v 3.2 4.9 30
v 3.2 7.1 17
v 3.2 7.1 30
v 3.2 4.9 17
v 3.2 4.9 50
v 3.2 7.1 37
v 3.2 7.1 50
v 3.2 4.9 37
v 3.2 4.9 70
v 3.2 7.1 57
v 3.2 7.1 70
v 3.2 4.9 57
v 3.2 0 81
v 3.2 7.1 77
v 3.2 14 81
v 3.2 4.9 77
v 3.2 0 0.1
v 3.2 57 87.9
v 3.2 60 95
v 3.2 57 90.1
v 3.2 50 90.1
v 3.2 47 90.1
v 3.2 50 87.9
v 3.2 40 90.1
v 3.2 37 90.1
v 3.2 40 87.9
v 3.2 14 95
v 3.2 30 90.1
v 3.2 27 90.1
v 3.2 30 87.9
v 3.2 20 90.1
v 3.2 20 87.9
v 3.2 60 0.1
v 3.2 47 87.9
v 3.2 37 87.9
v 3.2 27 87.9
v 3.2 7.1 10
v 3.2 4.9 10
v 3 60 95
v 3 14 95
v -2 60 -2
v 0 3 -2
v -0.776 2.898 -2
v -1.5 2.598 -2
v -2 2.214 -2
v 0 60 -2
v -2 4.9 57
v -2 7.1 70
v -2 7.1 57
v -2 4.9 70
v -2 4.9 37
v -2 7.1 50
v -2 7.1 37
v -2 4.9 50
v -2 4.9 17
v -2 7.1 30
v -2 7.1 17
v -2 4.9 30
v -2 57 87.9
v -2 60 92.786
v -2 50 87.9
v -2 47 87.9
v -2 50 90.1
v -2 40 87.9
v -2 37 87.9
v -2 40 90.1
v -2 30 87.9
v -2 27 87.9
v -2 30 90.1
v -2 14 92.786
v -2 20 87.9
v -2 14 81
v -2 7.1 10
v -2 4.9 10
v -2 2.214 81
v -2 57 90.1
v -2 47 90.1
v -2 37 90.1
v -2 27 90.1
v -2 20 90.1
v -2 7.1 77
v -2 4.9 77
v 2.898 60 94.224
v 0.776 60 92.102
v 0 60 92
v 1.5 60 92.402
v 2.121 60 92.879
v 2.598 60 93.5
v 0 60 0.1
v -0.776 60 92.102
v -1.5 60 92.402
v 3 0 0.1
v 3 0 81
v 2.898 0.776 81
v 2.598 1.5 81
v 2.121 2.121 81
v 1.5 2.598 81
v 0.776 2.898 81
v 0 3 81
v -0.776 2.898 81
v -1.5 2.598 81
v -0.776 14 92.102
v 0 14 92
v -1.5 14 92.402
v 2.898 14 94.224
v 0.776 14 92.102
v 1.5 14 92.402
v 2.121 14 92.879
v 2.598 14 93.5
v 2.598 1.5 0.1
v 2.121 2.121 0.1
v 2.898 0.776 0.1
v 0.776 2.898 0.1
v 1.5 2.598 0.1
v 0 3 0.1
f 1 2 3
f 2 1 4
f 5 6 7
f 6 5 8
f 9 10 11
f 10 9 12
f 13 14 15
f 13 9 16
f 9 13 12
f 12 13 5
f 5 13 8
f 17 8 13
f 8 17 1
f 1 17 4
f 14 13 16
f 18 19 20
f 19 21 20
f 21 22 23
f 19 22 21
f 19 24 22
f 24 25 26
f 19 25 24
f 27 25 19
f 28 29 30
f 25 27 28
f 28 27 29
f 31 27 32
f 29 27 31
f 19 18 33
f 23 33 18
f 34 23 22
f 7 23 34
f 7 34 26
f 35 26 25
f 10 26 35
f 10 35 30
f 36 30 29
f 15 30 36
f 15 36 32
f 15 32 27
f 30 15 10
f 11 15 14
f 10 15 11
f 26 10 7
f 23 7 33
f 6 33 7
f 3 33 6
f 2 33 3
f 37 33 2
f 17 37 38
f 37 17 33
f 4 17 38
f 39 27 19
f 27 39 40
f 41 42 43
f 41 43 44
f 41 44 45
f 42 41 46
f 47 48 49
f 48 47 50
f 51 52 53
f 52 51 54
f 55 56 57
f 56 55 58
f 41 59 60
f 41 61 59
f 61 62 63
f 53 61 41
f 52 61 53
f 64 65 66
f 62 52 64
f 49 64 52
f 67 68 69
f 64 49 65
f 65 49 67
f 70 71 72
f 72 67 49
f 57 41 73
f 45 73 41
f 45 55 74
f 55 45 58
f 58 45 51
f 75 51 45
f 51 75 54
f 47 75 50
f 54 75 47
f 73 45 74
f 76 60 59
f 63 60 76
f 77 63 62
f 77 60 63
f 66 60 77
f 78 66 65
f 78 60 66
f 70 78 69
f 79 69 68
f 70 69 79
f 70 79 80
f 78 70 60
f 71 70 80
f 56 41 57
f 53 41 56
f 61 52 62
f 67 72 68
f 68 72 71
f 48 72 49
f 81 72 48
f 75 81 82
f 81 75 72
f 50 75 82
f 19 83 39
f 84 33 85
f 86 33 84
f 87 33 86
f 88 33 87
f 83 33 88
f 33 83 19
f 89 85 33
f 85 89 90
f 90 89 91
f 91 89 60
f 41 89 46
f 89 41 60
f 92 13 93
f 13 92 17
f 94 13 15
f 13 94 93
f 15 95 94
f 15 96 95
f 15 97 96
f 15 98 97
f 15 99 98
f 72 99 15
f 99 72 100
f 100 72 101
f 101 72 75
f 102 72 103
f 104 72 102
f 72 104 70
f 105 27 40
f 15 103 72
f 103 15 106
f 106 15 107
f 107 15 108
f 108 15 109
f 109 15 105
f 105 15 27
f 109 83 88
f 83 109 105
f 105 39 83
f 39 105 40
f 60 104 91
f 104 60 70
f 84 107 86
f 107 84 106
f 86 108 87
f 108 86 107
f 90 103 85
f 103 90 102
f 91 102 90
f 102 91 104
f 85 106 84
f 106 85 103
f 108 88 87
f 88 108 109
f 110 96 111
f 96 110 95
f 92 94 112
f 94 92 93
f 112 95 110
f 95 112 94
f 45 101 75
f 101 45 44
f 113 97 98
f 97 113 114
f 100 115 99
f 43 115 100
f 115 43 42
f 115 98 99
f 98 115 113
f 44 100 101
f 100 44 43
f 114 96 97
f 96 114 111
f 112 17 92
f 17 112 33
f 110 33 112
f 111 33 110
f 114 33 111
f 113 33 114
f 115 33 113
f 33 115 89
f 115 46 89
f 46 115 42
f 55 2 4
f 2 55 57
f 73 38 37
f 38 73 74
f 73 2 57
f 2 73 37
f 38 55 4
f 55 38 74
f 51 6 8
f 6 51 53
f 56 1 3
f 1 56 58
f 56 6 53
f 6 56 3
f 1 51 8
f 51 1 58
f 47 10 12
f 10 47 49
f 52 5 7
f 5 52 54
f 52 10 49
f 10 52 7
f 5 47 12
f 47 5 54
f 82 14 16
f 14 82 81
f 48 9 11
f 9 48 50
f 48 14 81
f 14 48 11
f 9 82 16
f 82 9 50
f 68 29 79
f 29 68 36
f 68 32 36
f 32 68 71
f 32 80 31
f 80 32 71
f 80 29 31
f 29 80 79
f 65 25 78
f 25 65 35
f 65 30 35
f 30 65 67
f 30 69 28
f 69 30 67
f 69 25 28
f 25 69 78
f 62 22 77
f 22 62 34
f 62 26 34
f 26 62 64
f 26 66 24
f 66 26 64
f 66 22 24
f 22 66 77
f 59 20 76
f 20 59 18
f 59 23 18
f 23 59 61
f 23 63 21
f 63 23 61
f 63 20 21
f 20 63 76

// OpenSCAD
// file: ../OpenSCAD_Modules/cube_vround.scad
module cube_vround(
	size=[10,10,10],
	round_corners=[true,true,true,true],
	rounding=3,
	center_xy=false,
	center_z=false,
	attach=0,
	wall_attach=0,
	quality=2, //integer from 1 to infinity
)
{
	assert(len(size)==3);
	assert(len(round_corners)==4);
	assert(rounding>0);
	assert(rounding<=size[0]/2);
	assert(rounding<=size[1]/2);
	assert(quality>0);
	assert(attach>=0);
	assert(wall_attach>=0);
	height=size[2]+attach;
	cyl_r=rounding+wall_attach;
	cyl_mvx=size[0]/2-rounding;
	cyl_mvy=size[1]/2-rounding;
	cube_szx=size[0]/2;
	cube_szy=size[1]/2;
	cube_mvx=cube_szx/2+wall_attach;
	cube_mvy=cube_szy/2+wall_attach;
	translate([center_xy?0:cube_szx,center_xy?0:cube_szy,center_z?-attach/2:(size[2]-attach)/2])
		hull()
		{
			if(round_corners[0])
				translate([cyl_mvx,cyl_mvy])
					cylinder(r=cyl_r,h=height,$fn=12*quality,center=true);
			else
				translate([cube_mvx,cube_mvy])
					cube([cube_szx,cube_szy,height],center=true);
			if(round_corners[1])
				translate([cyl_mvx,-cyl_mvy])
					cylinder(r=cyl_r,h=height,$fn=12*quality,center=true);
			else
				translate([cube_mvx,-cube_mvy])
					cube([cube_szx,cube_szy,height],center=true);
			if(round_corners[2])
				translate([-cyl_mvx,-cyl_mvy])
					cylinder(r=cyl_r,h=height,$fn=12*quality,center=true);
			else
				translate([-cube_mvx,-cube_mvy])
					cube([cube_szx,cube_szy,height],center=true);
			if(round_corners[3])
				translate([-cyl_mvx,cyl_mvy])
					cylinder(r=cyl_r,h=height,$fn=12*quality,center=true);
			else
				translate([-cube_mvx,cube_mvy])
					cube([cube_szx,cube_szy,height],center=true);
		};
}

//example
cube_vround(round_corners=[true,false,true,false],
size=[10,20,6],
attach=0.1,
wall_attach=0.1,
rounding=3,
center_xy=true,center_z=false);
// main file
use <../OpenSCAD_Modules/cube_vround.scad>

module NylonTieCut
(
	extra_width=2,
	width=3.2,
	//lock cut
	cutHeight=7,
	cutWidth=2,
)
{
	cutClr=0.1;
	translate([-extra_width-cutClr,-cutClr,0])
		cube(size=[width+2*cutClr+extra_width, cutWidth+2*cutClr, cutHeight]);
}

module DB9Cut
(
	extra_width=2,
	width=3.2,
	screw_diam=3.25,
	conn_width=19,
	conn_height=13,
	screw_diff=25,
)
{
	cutClr=0.1;
	
}

module PowerPlugHolder
(
	height=60 ,
	width=3.2,
	extra_width=2,
	depth=125-30,
	extra_height=2,
	cornerCutL=18,
	cornerCutH=14,
	cornerCutD=14,
	cornerCutR=6/2,
	quality=1,
//lock cut
	cutShift=5,
	cutHeight=7,
	cutWidth=2,
)
{
	cutClr=0.1;
	difference()
	{
		//case base
		translate([-extra_width,0,-extra_height])
			cube(size=[width+extra_width,height,depth+extra_height]);
		translate([-cutClr-extra_width,-cutClr,depth-cornerCutD])
			cube([cornerCutL+extra_width+cutClr,cornerCutH+cutClr,cornerCutD+cutClr]);
		translate([-cutClr,0,depth])
			rotate(a=90,v=[0,1,0])
				cylinder(h=width+2*cutClr,r=cornerCutR,$fn=24*quality);
		translate([0,-cutClr,depth])
			rotate(a=90,v=[-1,0,0])
				cylinder(h=height+2*cutClr,r=cornerCutR,$fn=24*quality);
		translate([0,0,-cutClr-extra_height])
			cylinder(h=depth+2*cutClr+extra_height,r=cornerCutR,$fn=24*quality);
		translate([0,-cutClr,-cutClr-extra_height])
			cube(size=[width+cutClr,height+2*cutClr,2*cutClr+extra_height]);
		translate([0,cutShift,10])
			NylonTieCut();
		translate([0,cutShift,30])
			NylonTieCut();
		translate([0,cutShift,50])
			NylonTieCut();
		translate([0,cutShift,70])
			NylonTieCut();
		translate([0,20,depth-cutShift])
			rotate(a=-90,v=[1,0,0])
				NylonTieCut();
		translate([0,30,depth-cutShift])
			rotate(a=-90,v=[1,0,0])
				NylonTieCut();
		translate([0,40,depth-cutShift])
			rotate(a=-90,v=[1,0,0])
				NylonTieCut();
		translate([0,50,depth-cutShift])
			rotate(a=-90,v=[1,0,0])
				NylonTieCut();
	}
}

PowerPlugHolder();
